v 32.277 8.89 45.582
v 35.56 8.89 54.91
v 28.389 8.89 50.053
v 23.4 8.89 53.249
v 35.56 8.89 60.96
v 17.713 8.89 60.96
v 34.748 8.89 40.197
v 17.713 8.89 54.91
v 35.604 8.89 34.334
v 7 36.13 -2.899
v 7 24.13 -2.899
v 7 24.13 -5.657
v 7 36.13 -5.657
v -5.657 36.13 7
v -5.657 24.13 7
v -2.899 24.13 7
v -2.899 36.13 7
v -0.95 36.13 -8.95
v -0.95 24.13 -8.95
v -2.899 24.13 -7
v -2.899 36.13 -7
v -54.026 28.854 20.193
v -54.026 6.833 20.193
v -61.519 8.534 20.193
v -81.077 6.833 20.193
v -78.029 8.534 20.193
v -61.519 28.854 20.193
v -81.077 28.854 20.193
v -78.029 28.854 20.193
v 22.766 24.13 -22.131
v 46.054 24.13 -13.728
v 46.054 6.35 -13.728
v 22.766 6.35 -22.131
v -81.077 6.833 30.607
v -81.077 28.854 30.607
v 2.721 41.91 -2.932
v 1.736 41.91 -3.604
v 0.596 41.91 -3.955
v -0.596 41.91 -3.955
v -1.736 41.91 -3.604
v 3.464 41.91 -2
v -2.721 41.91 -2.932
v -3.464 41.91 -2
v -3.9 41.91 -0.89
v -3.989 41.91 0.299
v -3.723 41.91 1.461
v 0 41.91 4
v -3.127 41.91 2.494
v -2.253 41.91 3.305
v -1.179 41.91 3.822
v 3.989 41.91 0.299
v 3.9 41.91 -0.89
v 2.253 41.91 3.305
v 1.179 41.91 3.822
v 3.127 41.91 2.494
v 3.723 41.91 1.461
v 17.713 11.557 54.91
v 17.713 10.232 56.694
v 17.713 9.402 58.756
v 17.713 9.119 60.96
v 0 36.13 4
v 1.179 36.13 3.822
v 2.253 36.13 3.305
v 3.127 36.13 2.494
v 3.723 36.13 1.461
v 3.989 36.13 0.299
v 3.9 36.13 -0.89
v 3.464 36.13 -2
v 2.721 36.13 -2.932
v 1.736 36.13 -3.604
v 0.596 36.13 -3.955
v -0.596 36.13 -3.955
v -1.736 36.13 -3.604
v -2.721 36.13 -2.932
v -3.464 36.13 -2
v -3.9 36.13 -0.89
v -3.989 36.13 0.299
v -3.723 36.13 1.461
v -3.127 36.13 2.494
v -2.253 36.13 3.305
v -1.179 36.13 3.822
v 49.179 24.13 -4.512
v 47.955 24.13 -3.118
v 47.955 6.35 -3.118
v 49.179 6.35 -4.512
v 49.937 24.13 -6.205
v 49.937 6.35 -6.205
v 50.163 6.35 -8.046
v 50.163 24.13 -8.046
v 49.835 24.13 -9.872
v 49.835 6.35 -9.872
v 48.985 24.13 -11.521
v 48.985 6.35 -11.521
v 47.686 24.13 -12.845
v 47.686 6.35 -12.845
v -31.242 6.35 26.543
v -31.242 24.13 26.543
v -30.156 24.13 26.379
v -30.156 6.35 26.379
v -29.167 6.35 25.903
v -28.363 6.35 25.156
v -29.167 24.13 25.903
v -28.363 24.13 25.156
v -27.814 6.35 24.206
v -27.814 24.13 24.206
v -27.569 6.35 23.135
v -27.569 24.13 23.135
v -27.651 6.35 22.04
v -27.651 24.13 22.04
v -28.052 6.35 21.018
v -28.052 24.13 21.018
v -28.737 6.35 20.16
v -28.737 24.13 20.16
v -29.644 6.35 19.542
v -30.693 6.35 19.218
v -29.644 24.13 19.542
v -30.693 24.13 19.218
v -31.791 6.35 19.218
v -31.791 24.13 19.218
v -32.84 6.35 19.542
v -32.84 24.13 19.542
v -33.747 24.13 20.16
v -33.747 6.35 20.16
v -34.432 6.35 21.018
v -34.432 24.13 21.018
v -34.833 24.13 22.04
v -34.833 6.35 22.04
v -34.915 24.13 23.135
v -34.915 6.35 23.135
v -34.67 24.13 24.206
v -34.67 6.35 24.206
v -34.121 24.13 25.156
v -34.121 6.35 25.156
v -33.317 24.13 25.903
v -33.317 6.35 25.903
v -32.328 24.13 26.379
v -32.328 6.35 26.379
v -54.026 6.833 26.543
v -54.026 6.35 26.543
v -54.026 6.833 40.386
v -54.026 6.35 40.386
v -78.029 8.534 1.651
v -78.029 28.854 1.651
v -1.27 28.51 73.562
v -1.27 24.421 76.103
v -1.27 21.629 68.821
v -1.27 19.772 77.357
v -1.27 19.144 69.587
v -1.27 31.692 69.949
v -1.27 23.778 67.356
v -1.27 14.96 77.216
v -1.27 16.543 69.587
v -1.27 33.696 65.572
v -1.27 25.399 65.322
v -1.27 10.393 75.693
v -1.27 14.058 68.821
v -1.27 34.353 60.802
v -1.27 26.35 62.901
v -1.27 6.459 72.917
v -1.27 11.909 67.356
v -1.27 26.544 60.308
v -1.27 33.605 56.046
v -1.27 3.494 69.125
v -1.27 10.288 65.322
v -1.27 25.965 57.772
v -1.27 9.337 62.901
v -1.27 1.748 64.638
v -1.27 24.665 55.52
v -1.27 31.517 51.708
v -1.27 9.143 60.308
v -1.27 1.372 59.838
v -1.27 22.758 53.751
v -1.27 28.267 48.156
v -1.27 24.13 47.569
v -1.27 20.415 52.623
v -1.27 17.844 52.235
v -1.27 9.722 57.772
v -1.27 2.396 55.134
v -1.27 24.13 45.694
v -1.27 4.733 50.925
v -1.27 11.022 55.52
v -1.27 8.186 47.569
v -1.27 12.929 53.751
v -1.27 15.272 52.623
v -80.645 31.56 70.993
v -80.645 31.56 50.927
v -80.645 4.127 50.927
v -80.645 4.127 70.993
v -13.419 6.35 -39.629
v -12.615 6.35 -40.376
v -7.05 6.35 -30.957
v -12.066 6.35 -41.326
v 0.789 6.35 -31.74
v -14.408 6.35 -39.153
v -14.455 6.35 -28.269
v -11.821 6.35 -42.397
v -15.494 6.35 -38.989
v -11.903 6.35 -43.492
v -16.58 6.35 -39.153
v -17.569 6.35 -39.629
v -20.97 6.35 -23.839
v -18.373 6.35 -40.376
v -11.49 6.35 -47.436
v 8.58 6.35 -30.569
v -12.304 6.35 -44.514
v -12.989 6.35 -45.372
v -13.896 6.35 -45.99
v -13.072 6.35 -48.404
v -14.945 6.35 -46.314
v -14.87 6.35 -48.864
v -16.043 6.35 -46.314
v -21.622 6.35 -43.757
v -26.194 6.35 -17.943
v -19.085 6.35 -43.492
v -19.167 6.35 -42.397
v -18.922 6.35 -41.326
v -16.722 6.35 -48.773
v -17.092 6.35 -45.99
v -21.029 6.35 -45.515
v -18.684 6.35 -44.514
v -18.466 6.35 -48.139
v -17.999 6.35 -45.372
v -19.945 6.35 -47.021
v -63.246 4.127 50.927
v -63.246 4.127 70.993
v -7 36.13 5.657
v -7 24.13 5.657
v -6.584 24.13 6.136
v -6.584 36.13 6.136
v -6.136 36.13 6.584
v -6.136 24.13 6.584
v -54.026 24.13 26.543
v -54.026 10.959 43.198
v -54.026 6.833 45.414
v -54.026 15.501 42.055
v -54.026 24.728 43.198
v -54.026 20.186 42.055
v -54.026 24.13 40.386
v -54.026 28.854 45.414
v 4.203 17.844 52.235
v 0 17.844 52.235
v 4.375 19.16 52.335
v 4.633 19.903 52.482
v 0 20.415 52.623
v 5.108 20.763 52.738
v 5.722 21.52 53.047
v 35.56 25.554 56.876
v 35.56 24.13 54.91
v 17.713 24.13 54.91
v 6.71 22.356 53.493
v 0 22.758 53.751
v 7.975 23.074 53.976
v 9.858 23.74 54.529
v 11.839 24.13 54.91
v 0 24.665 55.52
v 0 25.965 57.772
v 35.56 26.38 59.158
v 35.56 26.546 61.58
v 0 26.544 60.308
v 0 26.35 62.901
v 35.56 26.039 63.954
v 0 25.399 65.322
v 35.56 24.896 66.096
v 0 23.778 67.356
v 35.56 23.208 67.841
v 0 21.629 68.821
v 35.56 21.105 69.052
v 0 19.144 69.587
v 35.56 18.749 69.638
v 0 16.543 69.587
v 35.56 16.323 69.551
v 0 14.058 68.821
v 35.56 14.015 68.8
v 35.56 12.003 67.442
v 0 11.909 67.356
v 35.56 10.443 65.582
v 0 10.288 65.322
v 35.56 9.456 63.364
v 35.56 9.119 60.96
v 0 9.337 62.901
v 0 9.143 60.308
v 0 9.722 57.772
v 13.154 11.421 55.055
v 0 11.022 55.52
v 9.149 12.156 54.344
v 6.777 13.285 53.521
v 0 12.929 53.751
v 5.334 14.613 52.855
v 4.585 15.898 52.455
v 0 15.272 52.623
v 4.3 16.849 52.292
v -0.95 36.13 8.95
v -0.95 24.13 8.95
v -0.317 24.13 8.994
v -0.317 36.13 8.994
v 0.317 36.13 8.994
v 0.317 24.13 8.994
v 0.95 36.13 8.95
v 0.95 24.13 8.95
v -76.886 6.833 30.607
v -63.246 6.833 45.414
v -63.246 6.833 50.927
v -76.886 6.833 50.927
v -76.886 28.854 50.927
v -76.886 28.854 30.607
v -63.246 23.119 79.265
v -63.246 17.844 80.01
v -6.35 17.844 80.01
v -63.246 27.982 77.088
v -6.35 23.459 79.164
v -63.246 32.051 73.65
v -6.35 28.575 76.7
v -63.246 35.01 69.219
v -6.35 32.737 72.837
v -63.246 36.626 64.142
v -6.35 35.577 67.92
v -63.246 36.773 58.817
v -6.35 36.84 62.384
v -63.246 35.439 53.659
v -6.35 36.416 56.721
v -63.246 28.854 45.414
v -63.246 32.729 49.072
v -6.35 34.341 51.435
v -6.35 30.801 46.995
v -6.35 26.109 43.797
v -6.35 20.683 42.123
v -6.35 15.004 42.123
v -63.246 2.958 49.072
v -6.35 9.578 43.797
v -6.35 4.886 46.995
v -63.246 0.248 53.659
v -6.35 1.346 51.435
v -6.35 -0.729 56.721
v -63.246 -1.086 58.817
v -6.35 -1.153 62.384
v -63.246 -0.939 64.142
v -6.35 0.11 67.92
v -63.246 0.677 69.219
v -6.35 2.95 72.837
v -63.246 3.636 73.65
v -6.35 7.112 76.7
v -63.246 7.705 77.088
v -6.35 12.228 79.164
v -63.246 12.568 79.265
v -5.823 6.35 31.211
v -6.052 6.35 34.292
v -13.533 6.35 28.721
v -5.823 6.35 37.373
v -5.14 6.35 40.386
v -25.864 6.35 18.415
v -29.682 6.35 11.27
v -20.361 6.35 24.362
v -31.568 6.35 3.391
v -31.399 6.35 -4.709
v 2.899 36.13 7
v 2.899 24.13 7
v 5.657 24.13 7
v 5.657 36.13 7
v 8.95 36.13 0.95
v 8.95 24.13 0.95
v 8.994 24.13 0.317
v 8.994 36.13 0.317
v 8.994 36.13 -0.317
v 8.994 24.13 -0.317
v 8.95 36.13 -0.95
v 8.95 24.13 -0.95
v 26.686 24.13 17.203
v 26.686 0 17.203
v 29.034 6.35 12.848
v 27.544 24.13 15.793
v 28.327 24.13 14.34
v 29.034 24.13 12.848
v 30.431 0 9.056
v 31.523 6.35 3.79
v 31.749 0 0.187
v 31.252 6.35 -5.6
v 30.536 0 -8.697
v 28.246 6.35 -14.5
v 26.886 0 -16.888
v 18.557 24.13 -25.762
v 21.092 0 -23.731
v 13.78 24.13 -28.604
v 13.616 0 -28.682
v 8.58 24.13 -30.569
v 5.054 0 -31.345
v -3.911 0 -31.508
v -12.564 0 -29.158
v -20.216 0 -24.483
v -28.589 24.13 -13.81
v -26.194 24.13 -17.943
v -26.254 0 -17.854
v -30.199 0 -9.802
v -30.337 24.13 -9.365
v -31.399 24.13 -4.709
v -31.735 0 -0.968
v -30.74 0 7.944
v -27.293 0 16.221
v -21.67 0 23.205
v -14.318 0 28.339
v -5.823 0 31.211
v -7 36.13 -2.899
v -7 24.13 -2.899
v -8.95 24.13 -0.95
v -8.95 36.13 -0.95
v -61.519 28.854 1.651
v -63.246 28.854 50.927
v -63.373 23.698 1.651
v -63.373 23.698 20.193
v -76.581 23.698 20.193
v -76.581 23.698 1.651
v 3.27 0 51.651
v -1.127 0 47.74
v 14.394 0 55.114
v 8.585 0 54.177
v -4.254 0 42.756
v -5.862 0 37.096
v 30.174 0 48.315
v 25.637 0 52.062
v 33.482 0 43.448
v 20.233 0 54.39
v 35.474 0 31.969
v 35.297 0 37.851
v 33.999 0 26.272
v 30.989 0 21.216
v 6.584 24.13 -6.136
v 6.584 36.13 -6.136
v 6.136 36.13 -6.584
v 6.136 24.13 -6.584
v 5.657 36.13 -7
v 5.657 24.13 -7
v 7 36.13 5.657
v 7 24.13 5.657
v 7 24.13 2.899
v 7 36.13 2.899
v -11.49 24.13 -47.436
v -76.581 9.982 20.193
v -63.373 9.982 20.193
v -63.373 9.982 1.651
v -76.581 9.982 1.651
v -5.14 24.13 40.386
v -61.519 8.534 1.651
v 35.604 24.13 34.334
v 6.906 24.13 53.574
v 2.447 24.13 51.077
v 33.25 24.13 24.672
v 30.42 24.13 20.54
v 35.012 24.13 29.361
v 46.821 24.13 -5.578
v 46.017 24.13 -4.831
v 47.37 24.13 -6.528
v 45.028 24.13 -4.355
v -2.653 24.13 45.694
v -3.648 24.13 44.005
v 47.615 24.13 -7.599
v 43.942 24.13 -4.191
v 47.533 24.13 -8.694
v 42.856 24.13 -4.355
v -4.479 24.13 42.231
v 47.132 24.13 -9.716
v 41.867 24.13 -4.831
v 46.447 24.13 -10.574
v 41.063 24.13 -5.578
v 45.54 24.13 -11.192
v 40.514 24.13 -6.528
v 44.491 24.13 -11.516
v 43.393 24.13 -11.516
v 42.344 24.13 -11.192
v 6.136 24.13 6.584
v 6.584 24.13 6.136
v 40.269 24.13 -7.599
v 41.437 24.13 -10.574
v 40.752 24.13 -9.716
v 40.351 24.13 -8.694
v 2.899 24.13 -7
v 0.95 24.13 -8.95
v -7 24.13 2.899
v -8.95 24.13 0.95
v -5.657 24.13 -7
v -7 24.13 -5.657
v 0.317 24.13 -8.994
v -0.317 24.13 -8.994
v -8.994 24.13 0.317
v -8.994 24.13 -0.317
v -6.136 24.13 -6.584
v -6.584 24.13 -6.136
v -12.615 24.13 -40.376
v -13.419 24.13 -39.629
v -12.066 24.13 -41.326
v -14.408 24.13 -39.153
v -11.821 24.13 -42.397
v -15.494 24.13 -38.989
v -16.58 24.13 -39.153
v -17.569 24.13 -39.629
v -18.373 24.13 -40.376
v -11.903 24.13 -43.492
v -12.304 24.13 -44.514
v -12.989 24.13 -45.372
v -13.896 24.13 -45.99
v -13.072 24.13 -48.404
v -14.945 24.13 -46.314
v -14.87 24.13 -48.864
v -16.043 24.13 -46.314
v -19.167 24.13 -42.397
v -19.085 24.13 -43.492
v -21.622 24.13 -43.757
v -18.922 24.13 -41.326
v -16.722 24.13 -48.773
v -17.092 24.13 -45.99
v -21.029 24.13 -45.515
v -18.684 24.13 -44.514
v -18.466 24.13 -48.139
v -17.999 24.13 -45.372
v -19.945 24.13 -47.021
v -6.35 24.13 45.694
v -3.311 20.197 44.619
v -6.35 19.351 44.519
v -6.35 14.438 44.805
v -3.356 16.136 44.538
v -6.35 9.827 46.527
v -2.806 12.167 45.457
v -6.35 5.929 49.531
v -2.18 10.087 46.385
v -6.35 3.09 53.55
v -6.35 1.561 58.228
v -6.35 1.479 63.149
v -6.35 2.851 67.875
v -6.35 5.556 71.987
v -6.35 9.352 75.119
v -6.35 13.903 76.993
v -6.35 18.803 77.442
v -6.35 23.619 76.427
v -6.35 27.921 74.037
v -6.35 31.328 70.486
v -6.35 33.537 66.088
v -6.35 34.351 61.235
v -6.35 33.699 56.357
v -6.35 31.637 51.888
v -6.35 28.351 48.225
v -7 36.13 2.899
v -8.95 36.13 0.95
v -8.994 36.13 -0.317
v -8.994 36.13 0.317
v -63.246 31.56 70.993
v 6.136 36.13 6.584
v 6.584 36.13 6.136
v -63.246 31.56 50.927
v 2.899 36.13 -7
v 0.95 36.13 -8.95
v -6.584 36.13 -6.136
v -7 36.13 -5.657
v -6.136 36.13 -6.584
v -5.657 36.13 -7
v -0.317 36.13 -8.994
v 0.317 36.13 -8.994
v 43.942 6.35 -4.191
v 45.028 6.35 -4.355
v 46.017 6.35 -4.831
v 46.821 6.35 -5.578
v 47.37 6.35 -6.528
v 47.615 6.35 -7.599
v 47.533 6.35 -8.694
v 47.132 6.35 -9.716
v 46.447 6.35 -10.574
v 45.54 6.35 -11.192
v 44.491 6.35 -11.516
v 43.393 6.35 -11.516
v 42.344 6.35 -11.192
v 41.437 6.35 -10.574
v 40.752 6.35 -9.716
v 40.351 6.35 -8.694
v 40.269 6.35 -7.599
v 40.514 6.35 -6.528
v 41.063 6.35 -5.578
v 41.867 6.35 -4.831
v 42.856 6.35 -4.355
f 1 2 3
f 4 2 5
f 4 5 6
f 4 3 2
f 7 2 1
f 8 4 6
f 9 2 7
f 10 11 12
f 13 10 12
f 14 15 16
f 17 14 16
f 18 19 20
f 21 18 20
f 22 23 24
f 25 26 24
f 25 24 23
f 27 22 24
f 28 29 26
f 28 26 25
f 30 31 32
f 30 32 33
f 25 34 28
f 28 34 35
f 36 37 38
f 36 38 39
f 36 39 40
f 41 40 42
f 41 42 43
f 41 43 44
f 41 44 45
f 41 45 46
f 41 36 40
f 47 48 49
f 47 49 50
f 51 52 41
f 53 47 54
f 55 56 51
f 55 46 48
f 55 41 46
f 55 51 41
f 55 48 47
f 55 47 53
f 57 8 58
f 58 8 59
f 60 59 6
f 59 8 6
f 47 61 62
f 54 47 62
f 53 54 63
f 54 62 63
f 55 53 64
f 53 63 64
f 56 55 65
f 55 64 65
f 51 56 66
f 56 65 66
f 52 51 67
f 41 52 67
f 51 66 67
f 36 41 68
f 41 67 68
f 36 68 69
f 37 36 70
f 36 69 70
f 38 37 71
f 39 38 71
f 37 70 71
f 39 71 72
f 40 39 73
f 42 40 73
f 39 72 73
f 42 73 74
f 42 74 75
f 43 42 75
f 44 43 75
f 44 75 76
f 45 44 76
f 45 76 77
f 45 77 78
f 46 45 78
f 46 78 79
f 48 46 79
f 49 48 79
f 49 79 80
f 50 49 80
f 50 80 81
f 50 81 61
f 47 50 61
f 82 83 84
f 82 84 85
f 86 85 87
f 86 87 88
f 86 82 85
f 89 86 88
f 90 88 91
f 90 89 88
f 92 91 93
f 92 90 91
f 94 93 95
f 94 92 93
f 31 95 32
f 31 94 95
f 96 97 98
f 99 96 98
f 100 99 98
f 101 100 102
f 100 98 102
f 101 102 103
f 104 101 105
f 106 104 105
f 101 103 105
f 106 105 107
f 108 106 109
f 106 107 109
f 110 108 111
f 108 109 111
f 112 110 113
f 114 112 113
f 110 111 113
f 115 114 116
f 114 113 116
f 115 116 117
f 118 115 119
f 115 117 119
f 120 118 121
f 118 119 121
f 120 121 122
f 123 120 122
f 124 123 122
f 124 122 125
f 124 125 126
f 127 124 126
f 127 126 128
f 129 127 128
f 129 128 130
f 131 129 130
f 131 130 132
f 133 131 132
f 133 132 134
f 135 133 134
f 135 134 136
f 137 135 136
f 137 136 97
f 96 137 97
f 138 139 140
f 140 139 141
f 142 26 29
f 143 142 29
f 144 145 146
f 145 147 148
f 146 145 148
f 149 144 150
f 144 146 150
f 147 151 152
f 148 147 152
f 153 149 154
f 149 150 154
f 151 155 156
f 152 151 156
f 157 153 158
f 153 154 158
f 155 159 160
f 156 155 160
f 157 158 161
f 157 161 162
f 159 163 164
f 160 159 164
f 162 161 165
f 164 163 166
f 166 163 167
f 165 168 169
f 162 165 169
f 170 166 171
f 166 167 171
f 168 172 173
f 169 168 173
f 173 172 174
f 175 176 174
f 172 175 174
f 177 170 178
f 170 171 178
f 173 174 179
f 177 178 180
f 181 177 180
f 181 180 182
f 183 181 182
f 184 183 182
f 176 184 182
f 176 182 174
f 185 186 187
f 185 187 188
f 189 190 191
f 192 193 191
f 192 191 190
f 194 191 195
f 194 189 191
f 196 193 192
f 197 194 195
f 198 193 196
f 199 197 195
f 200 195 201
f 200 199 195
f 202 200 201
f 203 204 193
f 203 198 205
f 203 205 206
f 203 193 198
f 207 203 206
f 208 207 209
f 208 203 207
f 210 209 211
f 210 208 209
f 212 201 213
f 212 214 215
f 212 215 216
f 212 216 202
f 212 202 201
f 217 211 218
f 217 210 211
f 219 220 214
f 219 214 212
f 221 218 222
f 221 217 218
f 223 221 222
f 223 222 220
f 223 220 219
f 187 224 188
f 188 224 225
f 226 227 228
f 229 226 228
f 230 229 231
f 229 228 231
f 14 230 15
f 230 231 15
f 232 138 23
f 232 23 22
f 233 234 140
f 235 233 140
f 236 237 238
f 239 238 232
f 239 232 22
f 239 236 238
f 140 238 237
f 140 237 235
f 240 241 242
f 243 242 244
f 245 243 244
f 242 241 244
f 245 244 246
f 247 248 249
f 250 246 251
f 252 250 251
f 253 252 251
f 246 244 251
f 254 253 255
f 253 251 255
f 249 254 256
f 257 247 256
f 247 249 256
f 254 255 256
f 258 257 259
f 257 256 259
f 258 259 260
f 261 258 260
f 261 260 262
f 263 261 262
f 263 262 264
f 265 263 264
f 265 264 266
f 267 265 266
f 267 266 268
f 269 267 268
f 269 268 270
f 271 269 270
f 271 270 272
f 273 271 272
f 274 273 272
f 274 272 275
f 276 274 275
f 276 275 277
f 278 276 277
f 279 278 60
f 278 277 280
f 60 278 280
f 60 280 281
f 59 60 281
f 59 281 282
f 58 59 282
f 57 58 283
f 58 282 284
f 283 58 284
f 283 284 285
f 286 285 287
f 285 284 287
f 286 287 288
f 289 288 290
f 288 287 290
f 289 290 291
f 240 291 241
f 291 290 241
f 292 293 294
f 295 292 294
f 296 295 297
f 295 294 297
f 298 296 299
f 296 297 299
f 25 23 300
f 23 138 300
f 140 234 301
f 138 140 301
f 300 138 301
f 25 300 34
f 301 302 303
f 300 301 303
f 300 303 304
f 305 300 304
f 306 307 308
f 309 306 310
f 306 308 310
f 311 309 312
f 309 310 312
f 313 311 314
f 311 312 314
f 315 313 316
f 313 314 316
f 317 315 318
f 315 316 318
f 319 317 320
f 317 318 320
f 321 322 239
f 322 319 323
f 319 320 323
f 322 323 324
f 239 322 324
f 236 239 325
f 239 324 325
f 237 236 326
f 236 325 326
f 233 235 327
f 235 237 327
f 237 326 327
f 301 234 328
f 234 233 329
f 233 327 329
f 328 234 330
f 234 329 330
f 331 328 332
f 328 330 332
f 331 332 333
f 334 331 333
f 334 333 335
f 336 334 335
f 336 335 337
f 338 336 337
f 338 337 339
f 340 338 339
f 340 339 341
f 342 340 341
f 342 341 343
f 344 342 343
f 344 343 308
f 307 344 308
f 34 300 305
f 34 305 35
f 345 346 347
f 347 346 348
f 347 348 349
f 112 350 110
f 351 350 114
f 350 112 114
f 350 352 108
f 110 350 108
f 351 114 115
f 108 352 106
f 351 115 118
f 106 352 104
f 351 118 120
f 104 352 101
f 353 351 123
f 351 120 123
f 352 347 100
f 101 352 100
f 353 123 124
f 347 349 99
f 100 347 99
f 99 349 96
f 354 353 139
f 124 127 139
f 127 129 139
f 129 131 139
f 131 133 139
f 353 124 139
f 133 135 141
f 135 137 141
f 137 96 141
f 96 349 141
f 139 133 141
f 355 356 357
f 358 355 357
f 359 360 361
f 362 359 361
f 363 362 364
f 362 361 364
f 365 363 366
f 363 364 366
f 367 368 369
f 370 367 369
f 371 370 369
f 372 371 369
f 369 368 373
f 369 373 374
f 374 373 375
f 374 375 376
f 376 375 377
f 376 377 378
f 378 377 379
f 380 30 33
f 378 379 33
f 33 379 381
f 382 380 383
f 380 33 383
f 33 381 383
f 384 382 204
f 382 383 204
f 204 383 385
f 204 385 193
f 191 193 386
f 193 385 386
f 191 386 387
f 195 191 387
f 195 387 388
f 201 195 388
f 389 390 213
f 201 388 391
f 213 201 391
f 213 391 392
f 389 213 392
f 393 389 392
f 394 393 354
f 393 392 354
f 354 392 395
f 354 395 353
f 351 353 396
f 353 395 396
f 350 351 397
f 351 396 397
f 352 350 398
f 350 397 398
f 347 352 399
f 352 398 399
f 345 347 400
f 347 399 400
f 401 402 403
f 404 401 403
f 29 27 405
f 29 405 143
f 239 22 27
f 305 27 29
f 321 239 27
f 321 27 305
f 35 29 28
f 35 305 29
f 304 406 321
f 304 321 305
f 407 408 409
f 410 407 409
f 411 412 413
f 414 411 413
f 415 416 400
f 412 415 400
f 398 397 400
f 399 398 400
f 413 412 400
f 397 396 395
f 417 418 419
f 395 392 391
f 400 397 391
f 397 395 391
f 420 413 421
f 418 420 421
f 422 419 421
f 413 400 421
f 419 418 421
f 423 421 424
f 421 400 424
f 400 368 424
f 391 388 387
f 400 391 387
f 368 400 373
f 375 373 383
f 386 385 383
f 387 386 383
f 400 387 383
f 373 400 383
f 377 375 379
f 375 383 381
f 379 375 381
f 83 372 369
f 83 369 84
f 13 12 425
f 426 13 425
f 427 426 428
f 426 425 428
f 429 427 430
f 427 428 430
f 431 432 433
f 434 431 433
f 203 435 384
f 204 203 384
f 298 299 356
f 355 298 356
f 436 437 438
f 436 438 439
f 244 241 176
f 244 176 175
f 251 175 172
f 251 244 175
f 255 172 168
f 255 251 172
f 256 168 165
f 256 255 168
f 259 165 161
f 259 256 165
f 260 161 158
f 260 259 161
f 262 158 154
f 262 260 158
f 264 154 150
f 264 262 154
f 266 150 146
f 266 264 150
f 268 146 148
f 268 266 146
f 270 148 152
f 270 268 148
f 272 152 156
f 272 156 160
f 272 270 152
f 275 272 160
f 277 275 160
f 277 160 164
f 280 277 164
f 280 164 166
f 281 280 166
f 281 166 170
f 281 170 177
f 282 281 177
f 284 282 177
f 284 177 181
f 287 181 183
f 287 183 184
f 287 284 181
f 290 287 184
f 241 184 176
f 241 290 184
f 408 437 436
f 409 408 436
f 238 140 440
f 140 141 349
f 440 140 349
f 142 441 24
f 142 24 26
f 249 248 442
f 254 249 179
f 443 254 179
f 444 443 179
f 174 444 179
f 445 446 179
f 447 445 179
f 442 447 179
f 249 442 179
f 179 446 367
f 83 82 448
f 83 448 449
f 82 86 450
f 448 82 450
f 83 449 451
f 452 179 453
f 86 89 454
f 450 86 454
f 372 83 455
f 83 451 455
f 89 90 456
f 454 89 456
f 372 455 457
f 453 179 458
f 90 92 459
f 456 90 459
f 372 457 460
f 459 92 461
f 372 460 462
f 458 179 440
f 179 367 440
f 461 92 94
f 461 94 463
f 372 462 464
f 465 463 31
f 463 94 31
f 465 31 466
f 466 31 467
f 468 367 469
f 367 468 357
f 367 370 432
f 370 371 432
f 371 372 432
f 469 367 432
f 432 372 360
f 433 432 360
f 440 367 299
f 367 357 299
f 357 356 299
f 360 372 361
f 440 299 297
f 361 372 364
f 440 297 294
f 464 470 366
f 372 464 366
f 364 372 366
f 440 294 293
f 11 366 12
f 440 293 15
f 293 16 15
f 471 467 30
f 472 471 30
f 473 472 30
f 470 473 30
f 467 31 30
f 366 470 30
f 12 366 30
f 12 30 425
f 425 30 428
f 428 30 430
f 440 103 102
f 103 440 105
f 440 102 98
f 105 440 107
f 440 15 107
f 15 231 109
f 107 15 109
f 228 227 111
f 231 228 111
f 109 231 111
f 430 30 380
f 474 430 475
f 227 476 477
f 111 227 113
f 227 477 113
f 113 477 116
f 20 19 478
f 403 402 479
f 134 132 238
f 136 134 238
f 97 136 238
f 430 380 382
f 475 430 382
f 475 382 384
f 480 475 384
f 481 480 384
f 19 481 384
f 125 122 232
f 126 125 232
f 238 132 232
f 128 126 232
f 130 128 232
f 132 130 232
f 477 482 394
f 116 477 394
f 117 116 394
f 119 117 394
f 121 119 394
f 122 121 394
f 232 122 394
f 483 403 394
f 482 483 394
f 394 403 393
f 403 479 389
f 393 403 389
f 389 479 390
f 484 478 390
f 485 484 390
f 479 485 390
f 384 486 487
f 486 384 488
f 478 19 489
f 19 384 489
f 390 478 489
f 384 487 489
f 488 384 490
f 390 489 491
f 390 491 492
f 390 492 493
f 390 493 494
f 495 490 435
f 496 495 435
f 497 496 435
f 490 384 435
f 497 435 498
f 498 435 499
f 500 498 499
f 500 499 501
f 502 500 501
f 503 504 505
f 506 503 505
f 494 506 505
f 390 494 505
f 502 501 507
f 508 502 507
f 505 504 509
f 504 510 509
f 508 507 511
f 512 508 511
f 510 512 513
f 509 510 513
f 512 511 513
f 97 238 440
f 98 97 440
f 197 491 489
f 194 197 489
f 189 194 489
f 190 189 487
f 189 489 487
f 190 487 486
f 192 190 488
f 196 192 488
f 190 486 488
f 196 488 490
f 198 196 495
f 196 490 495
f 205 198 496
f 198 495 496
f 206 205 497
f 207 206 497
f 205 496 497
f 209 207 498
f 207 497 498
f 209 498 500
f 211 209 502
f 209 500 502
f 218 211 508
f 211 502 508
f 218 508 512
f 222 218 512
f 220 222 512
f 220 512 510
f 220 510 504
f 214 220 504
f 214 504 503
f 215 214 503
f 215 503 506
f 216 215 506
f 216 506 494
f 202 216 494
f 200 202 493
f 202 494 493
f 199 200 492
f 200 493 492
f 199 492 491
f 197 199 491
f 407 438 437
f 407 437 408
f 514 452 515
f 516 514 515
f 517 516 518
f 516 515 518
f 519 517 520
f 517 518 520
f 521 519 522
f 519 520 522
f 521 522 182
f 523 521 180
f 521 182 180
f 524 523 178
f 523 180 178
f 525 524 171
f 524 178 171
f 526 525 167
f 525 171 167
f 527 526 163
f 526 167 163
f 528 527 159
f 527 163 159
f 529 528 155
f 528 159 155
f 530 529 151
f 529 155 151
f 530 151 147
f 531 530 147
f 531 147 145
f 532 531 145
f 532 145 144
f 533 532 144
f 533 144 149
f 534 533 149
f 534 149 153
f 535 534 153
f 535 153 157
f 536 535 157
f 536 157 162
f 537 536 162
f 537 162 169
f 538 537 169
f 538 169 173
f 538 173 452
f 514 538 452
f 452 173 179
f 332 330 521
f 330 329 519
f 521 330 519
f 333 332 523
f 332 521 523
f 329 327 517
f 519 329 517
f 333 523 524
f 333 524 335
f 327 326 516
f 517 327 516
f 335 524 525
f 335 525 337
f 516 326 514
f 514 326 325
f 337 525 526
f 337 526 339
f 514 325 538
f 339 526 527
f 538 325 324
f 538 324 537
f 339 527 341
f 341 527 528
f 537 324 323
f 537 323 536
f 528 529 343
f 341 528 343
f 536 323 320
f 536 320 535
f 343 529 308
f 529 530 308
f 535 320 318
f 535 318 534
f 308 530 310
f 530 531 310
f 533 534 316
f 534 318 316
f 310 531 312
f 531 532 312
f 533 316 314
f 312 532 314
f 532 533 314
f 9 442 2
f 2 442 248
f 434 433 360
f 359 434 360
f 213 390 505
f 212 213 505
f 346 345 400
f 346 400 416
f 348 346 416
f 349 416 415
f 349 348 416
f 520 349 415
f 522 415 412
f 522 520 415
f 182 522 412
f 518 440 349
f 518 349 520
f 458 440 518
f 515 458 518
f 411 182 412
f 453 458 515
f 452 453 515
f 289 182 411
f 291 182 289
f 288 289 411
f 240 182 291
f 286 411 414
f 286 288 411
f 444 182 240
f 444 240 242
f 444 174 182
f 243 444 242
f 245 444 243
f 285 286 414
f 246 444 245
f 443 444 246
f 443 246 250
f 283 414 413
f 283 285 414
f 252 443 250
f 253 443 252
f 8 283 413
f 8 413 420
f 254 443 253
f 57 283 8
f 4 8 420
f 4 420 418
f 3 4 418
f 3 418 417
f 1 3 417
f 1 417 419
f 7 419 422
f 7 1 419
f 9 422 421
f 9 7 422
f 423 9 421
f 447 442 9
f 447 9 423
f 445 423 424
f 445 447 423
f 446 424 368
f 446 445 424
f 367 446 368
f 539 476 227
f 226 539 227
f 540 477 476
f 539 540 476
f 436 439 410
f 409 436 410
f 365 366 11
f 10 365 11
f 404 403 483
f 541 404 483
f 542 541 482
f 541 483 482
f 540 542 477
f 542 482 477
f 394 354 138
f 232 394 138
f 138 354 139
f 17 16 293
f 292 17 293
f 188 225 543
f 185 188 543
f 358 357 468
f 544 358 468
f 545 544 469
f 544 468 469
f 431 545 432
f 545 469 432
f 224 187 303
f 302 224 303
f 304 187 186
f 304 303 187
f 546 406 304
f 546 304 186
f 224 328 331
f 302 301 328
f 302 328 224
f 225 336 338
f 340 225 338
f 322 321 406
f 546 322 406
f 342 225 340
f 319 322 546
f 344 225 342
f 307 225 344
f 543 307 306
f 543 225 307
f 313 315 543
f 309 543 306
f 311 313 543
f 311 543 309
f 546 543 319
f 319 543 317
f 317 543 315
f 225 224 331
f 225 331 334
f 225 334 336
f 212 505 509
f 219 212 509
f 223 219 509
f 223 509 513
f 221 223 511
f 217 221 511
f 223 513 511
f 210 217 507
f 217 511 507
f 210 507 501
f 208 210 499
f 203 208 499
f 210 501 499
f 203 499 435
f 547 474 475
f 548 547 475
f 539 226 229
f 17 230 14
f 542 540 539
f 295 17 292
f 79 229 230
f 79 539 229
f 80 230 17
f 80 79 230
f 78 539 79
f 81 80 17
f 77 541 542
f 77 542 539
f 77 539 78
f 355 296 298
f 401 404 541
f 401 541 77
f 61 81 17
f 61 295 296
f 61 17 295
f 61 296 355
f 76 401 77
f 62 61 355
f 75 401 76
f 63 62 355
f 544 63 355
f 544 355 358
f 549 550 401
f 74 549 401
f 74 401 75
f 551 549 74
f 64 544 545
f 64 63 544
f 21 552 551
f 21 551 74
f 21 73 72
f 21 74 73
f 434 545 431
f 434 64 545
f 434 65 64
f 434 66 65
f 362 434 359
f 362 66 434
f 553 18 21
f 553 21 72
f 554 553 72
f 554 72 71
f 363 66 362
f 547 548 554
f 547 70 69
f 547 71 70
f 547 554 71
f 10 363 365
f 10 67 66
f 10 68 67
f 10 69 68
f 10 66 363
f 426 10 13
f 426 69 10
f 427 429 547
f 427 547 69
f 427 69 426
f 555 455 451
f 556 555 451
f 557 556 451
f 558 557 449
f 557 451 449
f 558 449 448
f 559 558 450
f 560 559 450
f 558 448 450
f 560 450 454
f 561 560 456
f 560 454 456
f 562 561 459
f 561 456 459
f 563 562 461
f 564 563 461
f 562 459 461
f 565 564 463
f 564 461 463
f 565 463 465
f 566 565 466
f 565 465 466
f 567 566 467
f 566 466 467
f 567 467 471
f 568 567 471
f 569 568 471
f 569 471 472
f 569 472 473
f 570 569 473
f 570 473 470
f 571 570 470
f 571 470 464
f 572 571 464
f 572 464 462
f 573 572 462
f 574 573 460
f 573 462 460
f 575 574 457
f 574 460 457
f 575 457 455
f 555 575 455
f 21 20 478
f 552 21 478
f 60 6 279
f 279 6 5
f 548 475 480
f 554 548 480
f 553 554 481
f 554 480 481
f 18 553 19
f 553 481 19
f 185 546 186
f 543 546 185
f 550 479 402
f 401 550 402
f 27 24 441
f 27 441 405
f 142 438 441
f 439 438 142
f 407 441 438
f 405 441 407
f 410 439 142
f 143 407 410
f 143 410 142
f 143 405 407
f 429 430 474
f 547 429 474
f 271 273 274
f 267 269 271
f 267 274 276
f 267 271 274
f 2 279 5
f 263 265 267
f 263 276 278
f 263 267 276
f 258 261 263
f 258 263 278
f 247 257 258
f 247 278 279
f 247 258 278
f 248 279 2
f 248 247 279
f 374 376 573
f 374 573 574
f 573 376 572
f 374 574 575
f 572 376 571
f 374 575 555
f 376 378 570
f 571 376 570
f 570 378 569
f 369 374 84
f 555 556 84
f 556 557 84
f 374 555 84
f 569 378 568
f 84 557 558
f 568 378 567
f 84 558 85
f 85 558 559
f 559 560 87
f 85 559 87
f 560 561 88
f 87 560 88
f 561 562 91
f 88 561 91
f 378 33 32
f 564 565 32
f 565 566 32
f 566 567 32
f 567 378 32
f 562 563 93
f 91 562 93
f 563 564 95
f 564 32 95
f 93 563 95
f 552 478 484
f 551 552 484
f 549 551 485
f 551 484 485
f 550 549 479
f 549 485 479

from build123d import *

# Parameters (mm, degrees)
SKETCH1_R                = 31.75
BOSS_EXTRUDE1_DEPTH      = 24.13
SKETCH2_R                = 20.828
BOSS_EXTRUDE2_DEPTH      = 24.13
SKETCH3_R                = 8.7249
BOSS_EXTRUDE3_DEPTH      = 35.56
BOSS_EXTRUDE3_DEPTH_BACK = 1.27
SKETCH4_R                = 16.51
BOSS_EXTRUDE4_DEPTH      = 5.08
SKETCH5_R                = 19.05
BOSS_EXTRUDE5_DEPTH      = 56.896
SKETCH6_W                = 20.066
SKETCH6_H                = 27.432
BOSS_EXTRUDE6_DEPTH      = 17.399
SKETCH7_W                = 22.86
SKETCH7_H                = 22.0218
BOSS_EXTRUDE7_DEPTH      = 20.32
SKETCH8_W                = 27.051
SKETCH8_H                = 22.0218
BOSS_EXTRUDE8_DEPTH      = 10.414
SKETCH9_W                = 16.51
SKETCH9_H                = 20.32
BOSS_EXTRUDE9_DEPTH      = 18.542
SKETCH10_W               = 13.208
SKETCH10_H               = 13.716
CUT_EXTRUDE1_DEPTH       = 18.542
BOSS_EXTRUDE10_START     = -6.35
BOSS_EXTRUDE10_DEPTH     = 17.78
BOSS_EXTRUDE11_DEPTH     = 15.24
SKETCH13_W               = 17.847333413
SKETCH13_H               = 6.050107252
BOSS_EXTRUDE12_DEPTH     = 15.24
SKETCH14_R               = 3.683
BOSS_EXTRUDE13_DEPTH     = 17.78
SKETCH15_R               = 3.683
CUT_EXTRUDE2_DEPTH       = 117.691841319
SKETCH16_R               = 4
BOSS_EXTRUDE14_DEPTH     = 17.78
SKETCH17_R               = 4
BOSS_EXTRUDE15_DEPTH     = 12


with BuildPart() as part:
    # Sketch1 → Boss-Extrude1 (new body)
    with BuildSketch(Plane(origin=(0, 0, 0), x_dir=(1, 0, 0), z_dir=(0, 1, 0))):
        with Locations(Location((0, 0, 0), (0, 0, 90))):
            Circle(SKETCH1_R)
    extrude(amount=BOSS_EXTRUDE1_DEPTH)

    # Sketch2 → Boss-Extrude2 (add)
    with BuildSketch(Plane(origin=(0, 24.13, 0), x_dir=(1, 0, 0), z_dir=(0, 1, 0))):
        with Locations((14.775728205, -34.29)):
            Circle(SKETCH2_R)
    extrude(amount=-BOSS_EXTRUDE2_DEPTH)

    # Sketch3 → Boss-Extrude3 (add, two sides)
    with BuildSketch(Plane(origin=(0, 0, 0), x_dir=(0, 0, -1), z_dir=(1, 0, 0))) as boss_extrude3_sk:
        with Locations((-60.96, 17.8435)):
            Circle(SKETCH3_R)
    extrude(amount=BOSS_EXTRUDE3_DEPTH)
    extrude(boss_extrude3_sk.sketch, amount=-BOSS_EXTRUDE3_DEPTH_BACK)

    # Sketch4 → Boss-Extrude4 (add)
    with BuildSketch(Plane.ZY.offset(1.27)):
        with Locations(Location((60.96, 17.8435, 0), (0, 0, 157.618661281))):
            Circle(SKETCH4_R)
    extrude(amount=BOSS_EXTRUDE4_DEPTH)

    # Sketch5 → Boss-Extrude5 (add)
    with BuildSketch(Plane.ZY.offset(6.35)):
        with Locations((60.96, 17.8435)):
            Circle(SKETCH5_R)
    extrude(amount=BOSS_EXTRUDE5_DEPTH)

    # Sketch6 → Boss-Extrude6 (add)
    with BuildSketch(Plane.ZY.offset(63.246)):
        with Locations((60.96, 17.8435)):
            Rectangle(SKETCH6_W, SKETCH6_H)
    extrude(amount=BOSS_EXTRUDE6_DEPTH)

    # Sketch7 → Boss-Extrude7 (add)
    with BuildSketch(Plane(origin=(0, 0, 50.927), x_dir=(-1, 0, 0), z_dir=(0, 0, -1))):
        with Locations((65.4558, 17.8435)):
            Rectangle(SKETCH7_W, SKETCH7_H)
    extrude(amount=BOSS_EXTRUDE7_DEPTH)

    # Sketch8 → Boss-Extrude8 (add)
    with BuildSketch(Plane(origin=(0, 0, 30.607), x_dir=(-1, 0, 0), z_dir=(0, 0, -1))):
        with Locations((67.5513, 17.8435)):
            Rectangle(SKETCH8_W, SKETCH8_H)
    extrude(amount=BOSS_EXTRUDE8_DEPTH)

    # Sketch9 → Boss-Extrude9 (add)
    with BuildSketch(Plane(origin=(0, 0, 20.193), x_dir=(-1, 0, 0), z_dir=(0, 0, -1))):
        with Locations((69.7738, 18.6944)):
            Rectangle(SKETCH9_W, SKETCH9_H)
    extrude(amount=BOSS_EXTRUDE9_DEPTH)

    # Sketch10 → Cut-Extrude1 (cut)
    with BuildSketch(Plane(origin=(0, 0, 1.651), x_dir=(-1, 0, 0), z_dir=(0, 0, -1))):
        with Locations((69.977, 16.8402)):
            Rectangle(SKETCH10_W, SKETCH10_H)
    extrude(amount=-CUT_EXTRUDE1_DEPTH, mode=Mode.SUBTRACT)

    # Sketch11 → Boss-Extrude10 (add)
    with BuildSketch(Plane.XZ.offset(BOSS_EXTRUDE10_START)):
        with BuildLine():
            Line((-31.398919365, -4.708541462), (-54.0258, 26.543))
            Line((-54.0258, 26.543), (-54.0258, 40.386))
            Line((-54.0258, 40.386), (-5.140204311, 40.386))
            ThreePointArc((-5.140204311, 40.386), (-5.994749346, 35.836882769), (-5.823485644, 31.211368361))
            ThreePointArc((-5.823485644, 31.211368361), (-25.863813313, 18.415364805), (-31.398919365, -4.708541462))
        make_face()
    extrude(amount=-BOSS_EXTRUDE10_DEPTH)

    # Sketch12 → Boss-Extrude11 (add)
    with BuildSketch(Plane(origin=(0, 24.13, 0), x_dir=(1, 0, 0), z_dir=(0, 1, 0))):
        with BuildLine():
            Line((35.60368127, -34.334216844), (35.56, -54.909892748))
            Line((35.56, -54.909892748), (17.712666587, -54.909892748))
            ThreePointArc((17.712666587, -54.909892748), (30.492983885, -47.956508622), (35.60368127, -34.334216844))
        make_face()
    extrude(amount=-BOSS_EXTRUDE11_DEPTH)

    # Sketch13 → Boss-Extrude12 (add)
    with BuildSketch(Plane.XZ.offset(-8.89)):
        with Locations((26.636333294, 57.934946374)):
            Rectangle(SKETCH13_W, SKETCH13_H)
    extrude(amount=-BOSS_EXTRUDE12_DEPTH)

    # Sketch14 → Boss-Extrude13 (add)
    with BuildSketch(Plane(origin=(0, 24.13, 0), x_dir=(1, 0, 0), z_dir=(0, 1, 0))):
        with BuildLine():
            Line((-26.194044188, 17.942534634), (-21.621621656, 43.757348716))
            ThreePointArc((-21.621621656, 43.757348716), (-17.617871268, 48.521350377), (-11.490249612, 47.436001661))
            Line((-11.490249612, 47.436001661), (8.579823912, 30.568760551))
            ThreePointArc((8.579823912, 30.568760551), (-10.836077898, 29.843624374), (-26.194044188, 17.942534634))
        make_face()
        with Locations(Location((-15.494, 42.672, 0), (0, 0, 270))):
            Circle(SKETCH14_R, mode=Mode.SUBTRACT)
        with BuildLine():
            Line((46.054149639, 13.727593162), (22.766210397, 22.130570805))
            ThreePointArc((22.766210397, 22.130570805), (31.252220413, 5.60010886), (29.034123834, -12.848429989))
            Line((29.034123834, -12.848429989), (47.955285562, 3.118028175))
            ThreePointArc((47.955285562, 3.118028175), (50.067435201, 8.971621337), (46.054149639, 13.727593162))
        make_face()
        with Locations(Location((43.942, 7.874, 0), (0, 0, 270))):
            Circle(SKETCH14_R, mode=Mode.SUBTRACT)
    extrude(amount=-BOSS_EXTRUDE13_DEPTH)

    # Sketch15 → Cut-Extrude2 (cut, through all)
    with BuildSketch(Plane(origin=(0, 24.13, 0), x_dir=(1, 0, 0), z_dir=(0, 1, 0))):
        with Locations(Location((-31.242, -22.86, 0), (0, 0, 270))):
            Circle(SKETCH15_R)
        with Locations(Location((43.942, 7.874, 0), (0, 0, 270))):
            Circle(SKETCH15_R)
        with Locations(Location((-15.494, 42.672, 0), (0, 0, 270))):
            Circle(SKETCH15_R)
    extrude(amount=-CUT_EXTRUDE2_DEPTH, mode=Mode.SUBTRACT)

    # Sketch16 → Boss-Extrude14 (add)
    with BuildSketch(Plane(origin=(0, 24.13, 0), x_dir=(1, 0, 0), z_dir=(0, 1, 0))):
        with Locations(Location((0, 0, 0), (0, 0, 270))):
            Circle(SKETCH16_R)
    extrude(amount=BOSS_EXTRUDE14_DEPTH)

    # Sketch17 → Boss-Extrude15 (add)
    with BuildSketch(Plane(origin=(0, 24.13, 0), x_dir=(1, 0, 0), z_dir=(0, 1, 0))):
        with BuildLine():
            Line((-2.899494937, -7), (-0.949747468, -8.949747468))
            ThreePointArc((-0.949747468, -8.949747468), (0, -9), (0.949747468, -8.949747468))
            Line((0.949747468, -8.949747468), (2.899494937, -7))
            Line((2.899494937, -7), (5.656854249, -7))
            ThreePointArc((5.656854249, -7), (6.363961031, -6.363961031), (7, -5.656854249))
            Line((7, -5.656854249), (7, -2.899494937))
            Line((7, -2.899494937), (8.949747468, -0.949747468))
            ThreePointArc((8.949747468, -0.949747468), (9, 0), (8.949747468, 0.949747468))
            Line((8.949747468, 0.949747468), (7, 2.899494937))
            Line((7, 2.899494937), (7, 5.656854249))
            ThreePointArc((7, 5.656854249), (6.363961031, 6.363961031), (5.656854249, 7))
            Line((5.656854249, 7), (2.899494937, 7))
            Line((2.899494937, 7), (0.949747468, 8.949747468))
            ThreePointArc((0.949747468, 8.949747468), (0, 9), (-0.949747468, 8.949747468))
            Line((-0.949747468, 8.949747468), (-2.899494937, 7))
            Line((-2.899494937, 7), (-5.656854249, 7))
            ThreePointArc((-5.656854249, 7), (-6.363961031, 6.363961031), (-7, 5.656854249))
            Line((-7, 5.656854249), (-7, 2.899494937))
            Line((-7, 2.899494937), (-8.949747468, 0.949747468))
            ThreePointArc((-8.949747468, 0.949747468), (-9, 0), (-8.949747468, -0.949747468))
            Line((-8.949747468, -0.949747468), (-7, -2.899494937))
            Line((-7, -2.899494937), (-7, -5.656854249))
            ThreePointArc((-7, -5.656854249), (-6.363961031, -6.363961031), (-5.656854249, -7))
            Line((-5.656854249, -7), (-2.899494937, -7))
        make_face()
        with Locations(Location((0, 0, 0), (0, 0, 270))):
            Circle(SKETCH17_R, mode=Mode.SUBTRACT)
    extrude(amount=BOSS_EXTRUDE15_DEPTH)


solid = part.part
